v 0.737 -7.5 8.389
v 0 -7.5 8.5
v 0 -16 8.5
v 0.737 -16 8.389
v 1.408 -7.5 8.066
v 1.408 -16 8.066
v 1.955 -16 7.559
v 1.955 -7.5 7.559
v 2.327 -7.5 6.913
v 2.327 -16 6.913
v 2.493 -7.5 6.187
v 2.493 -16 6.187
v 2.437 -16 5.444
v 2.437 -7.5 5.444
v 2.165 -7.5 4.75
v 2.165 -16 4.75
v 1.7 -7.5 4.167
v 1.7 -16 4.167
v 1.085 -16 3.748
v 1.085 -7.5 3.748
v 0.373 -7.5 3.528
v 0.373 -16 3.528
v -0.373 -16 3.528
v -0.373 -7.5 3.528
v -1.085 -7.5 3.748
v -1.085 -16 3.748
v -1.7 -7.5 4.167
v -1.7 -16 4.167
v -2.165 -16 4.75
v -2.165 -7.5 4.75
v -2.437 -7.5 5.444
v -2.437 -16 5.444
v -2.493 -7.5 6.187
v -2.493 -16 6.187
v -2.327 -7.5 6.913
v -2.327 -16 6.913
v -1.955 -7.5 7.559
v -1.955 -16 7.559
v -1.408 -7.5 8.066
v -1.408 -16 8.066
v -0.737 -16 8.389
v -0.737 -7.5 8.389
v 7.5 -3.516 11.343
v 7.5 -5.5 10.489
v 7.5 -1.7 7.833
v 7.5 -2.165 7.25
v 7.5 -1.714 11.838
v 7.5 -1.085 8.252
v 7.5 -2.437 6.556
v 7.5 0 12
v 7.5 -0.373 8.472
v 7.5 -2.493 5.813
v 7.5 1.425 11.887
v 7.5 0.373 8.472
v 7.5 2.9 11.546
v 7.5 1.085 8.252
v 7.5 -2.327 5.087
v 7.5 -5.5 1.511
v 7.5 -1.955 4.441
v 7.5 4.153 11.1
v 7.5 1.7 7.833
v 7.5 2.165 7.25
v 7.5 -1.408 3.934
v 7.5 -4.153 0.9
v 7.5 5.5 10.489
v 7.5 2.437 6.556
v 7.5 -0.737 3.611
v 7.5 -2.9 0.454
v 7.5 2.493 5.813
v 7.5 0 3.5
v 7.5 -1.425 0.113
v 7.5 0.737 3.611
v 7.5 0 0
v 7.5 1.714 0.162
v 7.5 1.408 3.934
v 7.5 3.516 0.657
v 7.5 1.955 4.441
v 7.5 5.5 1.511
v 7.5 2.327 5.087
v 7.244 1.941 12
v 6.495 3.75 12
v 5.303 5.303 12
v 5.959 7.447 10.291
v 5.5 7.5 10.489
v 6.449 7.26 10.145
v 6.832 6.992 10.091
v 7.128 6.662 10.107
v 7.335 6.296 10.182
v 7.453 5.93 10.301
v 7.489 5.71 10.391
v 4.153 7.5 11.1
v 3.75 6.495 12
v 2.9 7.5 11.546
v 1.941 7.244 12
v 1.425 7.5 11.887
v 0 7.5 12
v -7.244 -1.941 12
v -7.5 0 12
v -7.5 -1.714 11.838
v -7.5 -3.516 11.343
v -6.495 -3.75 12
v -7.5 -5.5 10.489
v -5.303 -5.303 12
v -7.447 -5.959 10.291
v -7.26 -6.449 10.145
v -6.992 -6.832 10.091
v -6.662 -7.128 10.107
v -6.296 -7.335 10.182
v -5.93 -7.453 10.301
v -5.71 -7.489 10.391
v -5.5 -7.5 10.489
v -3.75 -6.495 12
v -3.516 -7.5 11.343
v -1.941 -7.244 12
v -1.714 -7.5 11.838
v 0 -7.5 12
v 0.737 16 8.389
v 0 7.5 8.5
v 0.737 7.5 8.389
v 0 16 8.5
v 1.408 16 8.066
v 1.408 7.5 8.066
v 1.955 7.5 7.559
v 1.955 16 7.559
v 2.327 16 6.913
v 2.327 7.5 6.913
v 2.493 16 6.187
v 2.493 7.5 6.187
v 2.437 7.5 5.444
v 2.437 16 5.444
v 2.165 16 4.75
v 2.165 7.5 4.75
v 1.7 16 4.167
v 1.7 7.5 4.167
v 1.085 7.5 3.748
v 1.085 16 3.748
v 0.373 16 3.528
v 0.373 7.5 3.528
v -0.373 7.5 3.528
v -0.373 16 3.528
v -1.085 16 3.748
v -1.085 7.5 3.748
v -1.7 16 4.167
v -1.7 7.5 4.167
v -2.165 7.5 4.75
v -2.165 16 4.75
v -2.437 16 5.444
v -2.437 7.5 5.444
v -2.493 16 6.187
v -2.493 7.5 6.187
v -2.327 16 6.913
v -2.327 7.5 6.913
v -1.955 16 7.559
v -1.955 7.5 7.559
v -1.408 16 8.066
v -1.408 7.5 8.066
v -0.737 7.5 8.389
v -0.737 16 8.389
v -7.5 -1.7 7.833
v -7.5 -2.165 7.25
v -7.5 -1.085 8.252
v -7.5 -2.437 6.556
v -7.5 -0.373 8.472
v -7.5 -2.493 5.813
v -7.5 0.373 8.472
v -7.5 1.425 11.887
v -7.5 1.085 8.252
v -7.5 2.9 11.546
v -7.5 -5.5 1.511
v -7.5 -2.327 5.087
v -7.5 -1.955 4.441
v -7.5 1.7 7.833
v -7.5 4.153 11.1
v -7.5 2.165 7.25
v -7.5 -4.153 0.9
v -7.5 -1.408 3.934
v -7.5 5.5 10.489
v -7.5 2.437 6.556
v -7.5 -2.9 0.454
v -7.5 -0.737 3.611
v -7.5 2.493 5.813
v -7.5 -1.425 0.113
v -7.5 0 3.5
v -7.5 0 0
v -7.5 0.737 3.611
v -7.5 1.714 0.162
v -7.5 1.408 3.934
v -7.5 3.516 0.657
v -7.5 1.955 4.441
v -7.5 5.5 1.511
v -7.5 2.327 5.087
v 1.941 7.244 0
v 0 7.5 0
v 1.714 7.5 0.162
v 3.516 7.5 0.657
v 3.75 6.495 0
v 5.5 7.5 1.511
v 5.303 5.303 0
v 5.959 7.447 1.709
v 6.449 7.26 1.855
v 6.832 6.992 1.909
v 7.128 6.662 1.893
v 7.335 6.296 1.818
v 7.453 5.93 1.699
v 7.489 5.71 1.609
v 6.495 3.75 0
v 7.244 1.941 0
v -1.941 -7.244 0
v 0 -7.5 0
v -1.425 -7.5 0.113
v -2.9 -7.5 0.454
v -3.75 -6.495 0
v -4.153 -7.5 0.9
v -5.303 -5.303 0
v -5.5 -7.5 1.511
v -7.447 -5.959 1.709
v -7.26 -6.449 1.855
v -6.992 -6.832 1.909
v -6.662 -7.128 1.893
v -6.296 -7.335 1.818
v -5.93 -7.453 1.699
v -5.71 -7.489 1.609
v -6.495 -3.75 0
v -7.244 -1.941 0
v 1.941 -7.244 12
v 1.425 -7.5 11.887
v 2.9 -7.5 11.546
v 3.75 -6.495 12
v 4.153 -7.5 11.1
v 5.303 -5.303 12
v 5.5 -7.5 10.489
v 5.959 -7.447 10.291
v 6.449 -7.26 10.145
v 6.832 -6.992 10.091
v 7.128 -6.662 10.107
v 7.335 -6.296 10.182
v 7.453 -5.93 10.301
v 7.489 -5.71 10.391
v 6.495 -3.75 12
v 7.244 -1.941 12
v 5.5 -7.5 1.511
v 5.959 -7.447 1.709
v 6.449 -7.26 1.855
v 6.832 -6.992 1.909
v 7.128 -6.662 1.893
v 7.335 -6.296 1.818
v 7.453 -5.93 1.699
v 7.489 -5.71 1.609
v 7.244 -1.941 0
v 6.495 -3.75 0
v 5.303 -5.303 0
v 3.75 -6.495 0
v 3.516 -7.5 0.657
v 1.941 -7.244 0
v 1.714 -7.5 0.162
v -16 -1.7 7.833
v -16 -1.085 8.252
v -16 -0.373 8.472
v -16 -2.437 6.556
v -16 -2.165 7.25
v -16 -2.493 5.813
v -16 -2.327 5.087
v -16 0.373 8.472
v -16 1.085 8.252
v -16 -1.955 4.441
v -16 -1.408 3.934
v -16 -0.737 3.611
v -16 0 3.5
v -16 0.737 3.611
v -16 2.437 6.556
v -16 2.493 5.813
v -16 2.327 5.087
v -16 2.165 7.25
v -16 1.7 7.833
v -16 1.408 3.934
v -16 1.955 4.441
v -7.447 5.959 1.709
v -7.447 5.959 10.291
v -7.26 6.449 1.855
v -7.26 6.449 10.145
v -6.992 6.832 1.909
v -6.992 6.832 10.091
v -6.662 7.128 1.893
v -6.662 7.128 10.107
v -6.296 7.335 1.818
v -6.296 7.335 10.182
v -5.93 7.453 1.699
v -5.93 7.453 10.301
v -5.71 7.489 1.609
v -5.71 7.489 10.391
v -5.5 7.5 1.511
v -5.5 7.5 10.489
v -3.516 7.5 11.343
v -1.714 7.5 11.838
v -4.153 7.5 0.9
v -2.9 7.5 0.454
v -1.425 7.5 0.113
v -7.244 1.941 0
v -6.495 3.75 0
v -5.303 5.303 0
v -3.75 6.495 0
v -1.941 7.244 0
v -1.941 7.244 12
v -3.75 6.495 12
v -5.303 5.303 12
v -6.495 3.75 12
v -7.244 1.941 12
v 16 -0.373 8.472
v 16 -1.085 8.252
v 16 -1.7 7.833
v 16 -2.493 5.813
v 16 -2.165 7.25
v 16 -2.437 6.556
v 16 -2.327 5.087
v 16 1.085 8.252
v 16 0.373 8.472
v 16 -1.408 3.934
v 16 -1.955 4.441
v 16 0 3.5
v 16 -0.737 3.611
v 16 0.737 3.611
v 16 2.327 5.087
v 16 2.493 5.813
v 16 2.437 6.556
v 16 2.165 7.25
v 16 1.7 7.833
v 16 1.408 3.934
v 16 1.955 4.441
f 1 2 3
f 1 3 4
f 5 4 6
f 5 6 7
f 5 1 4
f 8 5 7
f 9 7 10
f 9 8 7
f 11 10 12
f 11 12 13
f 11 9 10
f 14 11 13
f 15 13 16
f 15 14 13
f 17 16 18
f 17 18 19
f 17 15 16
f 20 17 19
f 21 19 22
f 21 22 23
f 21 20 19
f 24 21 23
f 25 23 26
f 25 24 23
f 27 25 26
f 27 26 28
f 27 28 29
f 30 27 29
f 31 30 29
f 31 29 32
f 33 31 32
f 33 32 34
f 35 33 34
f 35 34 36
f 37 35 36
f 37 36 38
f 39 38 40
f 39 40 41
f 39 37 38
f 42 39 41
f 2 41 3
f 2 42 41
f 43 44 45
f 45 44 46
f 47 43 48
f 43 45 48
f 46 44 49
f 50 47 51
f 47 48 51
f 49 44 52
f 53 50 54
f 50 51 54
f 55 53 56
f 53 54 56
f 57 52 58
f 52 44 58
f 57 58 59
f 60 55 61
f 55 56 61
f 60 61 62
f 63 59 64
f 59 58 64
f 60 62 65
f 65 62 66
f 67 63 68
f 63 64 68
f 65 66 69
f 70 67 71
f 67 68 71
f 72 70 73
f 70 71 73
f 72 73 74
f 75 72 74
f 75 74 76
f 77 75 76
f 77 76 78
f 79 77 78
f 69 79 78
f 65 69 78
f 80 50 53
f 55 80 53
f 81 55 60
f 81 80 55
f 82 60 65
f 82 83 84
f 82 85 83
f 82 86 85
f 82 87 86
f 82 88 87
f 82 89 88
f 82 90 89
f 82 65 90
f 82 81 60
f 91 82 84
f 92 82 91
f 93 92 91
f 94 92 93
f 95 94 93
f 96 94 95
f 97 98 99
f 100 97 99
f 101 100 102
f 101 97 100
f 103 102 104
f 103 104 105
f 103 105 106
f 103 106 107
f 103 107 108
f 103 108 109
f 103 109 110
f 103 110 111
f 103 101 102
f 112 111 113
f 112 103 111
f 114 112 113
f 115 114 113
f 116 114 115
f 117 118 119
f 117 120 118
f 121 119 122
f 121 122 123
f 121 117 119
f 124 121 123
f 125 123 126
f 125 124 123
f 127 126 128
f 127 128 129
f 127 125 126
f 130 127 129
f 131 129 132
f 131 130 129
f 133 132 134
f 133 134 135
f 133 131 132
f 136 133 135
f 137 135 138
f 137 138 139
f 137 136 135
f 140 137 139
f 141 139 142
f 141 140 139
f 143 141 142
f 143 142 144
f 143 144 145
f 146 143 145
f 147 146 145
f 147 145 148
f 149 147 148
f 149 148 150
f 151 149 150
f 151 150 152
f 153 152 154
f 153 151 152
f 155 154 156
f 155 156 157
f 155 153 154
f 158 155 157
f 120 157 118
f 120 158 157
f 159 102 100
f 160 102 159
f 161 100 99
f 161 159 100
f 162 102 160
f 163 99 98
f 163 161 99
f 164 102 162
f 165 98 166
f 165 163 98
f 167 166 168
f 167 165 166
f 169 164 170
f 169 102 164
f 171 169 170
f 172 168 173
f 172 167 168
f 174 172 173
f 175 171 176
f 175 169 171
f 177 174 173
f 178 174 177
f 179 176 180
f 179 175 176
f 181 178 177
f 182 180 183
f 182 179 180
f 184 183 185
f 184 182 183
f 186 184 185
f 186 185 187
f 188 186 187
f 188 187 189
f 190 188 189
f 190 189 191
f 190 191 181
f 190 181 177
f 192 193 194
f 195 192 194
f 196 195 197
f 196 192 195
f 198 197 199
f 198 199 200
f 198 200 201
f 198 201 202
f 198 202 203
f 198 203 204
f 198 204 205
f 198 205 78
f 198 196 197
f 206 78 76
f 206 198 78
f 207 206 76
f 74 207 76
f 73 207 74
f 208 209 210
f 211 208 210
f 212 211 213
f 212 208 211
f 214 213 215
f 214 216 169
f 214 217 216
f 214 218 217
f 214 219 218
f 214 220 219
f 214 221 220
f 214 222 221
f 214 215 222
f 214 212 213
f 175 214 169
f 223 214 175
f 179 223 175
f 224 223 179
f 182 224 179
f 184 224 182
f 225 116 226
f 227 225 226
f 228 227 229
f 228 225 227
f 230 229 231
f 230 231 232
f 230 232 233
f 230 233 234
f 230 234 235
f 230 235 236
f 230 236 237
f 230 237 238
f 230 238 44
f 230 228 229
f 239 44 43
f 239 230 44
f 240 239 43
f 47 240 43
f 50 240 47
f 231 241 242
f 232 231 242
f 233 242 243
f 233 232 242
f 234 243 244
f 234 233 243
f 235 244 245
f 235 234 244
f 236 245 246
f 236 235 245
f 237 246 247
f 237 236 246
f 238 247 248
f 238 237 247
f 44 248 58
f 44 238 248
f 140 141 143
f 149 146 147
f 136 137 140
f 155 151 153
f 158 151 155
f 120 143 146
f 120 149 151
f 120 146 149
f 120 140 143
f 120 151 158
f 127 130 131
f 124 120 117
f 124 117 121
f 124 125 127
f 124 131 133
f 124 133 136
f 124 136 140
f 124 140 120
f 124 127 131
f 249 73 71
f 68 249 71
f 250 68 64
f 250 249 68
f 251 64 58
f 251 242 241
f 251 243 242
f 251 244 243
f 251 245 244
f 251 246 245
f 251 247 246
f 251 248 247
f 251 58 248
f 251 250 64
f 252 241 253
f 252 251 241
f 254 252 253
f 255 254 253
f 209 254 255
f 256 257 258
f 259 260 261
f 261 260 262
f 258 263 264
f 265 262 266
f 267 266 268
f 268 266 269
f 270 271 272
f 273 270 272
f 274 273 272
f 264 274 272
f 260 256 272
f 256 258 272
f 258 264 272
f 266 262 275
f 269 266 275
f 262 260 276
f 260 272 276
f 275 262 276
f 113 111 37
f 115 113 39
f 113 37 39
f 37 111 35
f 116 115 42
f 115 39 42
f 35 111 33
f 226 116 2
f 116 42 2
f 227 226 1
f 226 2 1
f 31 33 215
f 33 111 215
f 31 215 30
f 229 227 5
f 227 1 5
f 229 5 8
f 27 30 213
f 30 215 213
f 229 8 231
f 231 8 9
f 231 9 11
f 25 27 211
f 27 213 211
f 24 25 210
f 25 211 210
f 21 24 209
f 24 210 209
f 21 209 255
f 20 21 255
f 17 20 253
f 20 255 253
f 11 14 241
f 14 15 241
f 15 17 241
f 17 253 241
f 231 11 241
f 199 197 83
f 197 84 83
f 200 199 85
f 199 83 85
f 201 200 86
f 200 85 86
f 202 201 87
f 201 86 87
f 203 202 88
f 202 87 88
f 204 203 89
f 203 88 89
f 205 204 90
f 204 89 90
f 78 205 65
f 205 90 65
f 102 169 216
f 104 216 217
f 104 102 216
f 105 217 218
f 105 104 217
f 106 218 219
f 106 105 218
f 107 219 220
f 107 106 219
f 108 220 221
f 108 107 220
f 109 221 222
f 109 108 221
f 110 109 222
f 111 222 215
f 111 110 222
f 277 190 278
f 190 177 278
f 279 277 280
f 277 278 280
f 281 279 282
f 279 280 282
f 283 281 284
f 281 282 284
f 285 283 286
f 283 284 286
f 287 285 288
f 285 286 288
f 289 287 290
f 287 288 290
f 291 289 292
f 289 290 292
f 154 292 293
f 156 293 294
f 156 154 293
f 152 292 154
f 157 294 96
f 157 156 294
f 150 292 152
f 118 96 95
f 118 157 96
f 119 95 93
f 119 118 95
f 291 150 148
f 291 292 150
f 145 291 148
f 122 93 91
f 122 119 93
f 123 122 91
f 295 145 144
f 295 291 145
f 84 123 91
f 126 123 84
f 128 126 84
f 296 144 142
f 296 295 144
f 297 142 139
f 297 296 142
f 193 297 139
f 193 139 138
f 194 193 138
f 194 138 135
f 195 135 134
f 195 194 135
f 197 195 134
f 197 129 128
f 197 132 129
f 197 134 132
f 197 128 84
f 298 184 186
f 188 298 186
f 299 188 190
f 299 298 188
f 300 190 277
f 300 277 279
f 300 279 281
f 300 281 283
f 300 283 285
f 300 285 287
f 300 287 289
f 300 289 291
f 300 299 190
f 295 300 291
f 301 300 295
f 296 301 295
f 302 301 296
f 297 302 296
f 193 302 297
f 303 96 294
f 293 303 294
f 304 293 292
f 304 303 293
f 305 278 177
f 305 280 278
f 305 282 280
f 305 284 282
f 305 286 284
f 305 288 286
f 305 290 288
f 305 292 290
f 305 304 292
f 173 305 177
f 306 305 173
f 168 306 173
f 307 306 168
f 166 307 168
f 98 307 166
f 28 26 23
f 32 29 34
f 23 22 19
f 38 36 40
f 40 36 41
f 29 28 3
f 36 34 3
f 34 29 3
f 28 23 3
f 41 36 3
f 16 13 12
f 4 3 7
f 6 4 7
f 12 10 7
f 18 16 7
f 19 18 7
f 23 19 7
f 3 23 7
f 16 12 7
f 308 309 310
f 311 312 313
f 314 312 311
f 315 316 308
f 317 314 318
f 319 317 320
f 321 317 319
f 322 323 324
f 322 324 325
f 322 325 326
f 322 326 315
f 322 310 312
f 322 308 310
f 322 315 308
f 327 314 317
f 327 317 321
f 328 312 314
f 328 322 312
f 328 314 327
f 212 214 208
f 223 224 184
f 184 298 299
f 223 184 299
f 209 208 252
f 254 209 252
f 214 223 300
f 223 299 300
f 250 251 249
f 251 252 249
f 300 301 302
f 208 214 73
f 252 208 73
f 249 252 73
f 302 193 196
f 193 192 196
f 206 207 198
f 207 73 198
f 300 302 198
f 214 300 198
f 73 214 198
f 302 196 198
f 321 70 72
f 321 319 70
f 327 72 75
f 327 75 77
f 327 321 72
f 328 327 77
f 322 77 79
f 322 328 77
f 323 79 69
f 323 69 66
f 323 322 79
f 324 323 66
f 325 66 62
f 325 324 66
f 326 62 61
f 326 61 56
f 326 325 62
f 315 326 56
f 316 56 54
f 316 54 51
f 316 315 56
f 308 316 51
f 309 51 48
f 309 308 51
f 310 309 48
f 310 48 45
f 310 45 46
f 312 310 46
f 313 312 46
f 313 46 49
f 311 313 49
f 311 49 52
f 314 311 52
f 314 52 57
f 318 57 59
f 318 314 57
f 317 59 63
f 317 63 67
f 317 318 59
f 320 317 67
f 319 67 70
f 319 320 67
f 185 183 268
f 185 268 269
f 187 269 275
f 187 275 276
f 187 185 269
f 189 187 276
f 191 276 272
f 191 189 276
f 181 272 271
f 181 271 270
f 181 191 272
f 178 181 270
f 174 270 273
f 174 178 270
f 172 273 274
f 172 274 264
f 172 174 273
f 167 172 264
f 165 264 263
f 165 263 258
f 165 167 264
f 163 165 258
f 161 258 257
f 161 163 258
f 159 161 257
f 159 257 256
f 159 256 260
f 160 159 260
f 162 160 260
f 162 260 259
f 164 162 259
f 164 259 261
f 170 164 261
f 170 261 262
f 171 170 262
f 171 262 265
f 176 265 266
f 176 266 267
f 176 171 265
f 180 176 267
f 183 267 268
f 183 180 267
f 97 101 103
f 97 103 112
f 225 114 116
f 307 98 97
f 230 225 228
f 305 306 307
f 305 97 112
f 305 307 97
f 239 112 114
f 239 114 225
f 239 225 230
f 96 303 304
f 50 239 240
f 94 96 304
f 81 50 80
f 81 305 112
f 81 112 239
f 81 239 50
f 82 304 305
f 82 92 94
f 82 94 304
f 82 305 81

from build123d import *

# Parameters (mm, degrees)
SKETCH1_W           = 15
SKETCH1_H           = 15
BOSS_EXTRUDE1_DEPTH = 12
SKETCH2_OUTSIDE_W   = 69.544
SKETCH2_OUTSIDE_H   = 69.544
SKETCH2_OUTSIDE_R   = 7.5
CUT_EXTRUDE1_DEPTH  = 20
CUT_EXTRUDE1_DRAFT  = -50
SKETCH3_OUTSIDE_W   = 69.544
SKETCH3_OUTSIDE_H   = 69.544
SKETCH3_OUTSIDE_R   = 7.5
CUT_EXTRUDE2_DEPTH  = 20
CUT_EXTRUDE2_DRAFT  = -50
FILLET1_R           = 2
SKETCH5_R           = 2.5
BOSS_EXTRUDE2_DEPTH = 16
SKETCH6_R           = 2.5
BOSS_EXTRUDE3_DEPTH = 16


with BuildPart() as part:
    # Sketch1 → Boss-Extrude1 (new body)
    with BuildSketch(Plane.XY):
        Rectangle(SKETCH1_W, SKETCH1_H)
    extrude(amount=BOSS_EXTRUDE1_DEPTH)


with BuildPart() as cut_extrude1_tool:
    # Sketch2 outside → Cut-Extrude1 (with draft: the straight prism first)
    with BuildSketch(Plane.XY.offset(12)):
        Rectangle(SKETCH2_OUTSIDE_W, SKETCH2_OUTSIDE_H)
        Circle(SKETCH2_OUTSIDE_R, mode=Mode.SUBTRACT)
    extrude(amount=-CUT_EXTRUDE1_DEPTH)
    # Cut-Extrude1: the draft: its side faces are tilted about the plane it starts from
    cut_extrude1_sides = [cut_extrude1_tool.faces().sort_by_distance(p)[0] for p in [
        (0, -34.772, 2),
        (34.772, 0, 2),
        (0, 34.772, 2),
        (-34.772, 0, 2),
        (-7.5, 0, 2),
    ]]
    draft(cut_extrude1_sides, Plane.XY.offset(12), CUT_EXTRUDE1_DRAFT)


with BuildPart() as part_1:
    add(part.part)

    # Cut-Extrude1: cut by cut_extrude1_tool
    add(cut_extrude1_tool.part, mode=Mode.SUBTRACT)


with BuildPart() as cut_extrude2_tool:
    # Sketch3 outside → Cut-Extrude2 (with draft: the straight prism first)
    with BuildSketch(Plane(origin=(0, 0, 0), x_dir=(-1, 0, 0), z_dir=(0, 0, -1))):
        Rectangle(SKETCH3_OUTSIDE_W, SKETCH3_OUTSIDE_H)
        Circle(SKETCH3_OUTSIDE_R, mode=Mode.SUBTRACT)
    extrude(amount=-CUT_EXTRUDE2_DEPTH)
    # Cut-Extrude2: the draft: its side faces are tilted about the plane it starts from
    cut_extrude2_sides = [cut_extrude2_tool.faces().sort_by_distance(p)[0] for p in [
        (0, -34.772, 10),
        (-34.772, 0, 10),
        (0, 34.772, 10),
        (34.772, 0, 10),
        (7.5, 0, 10),
    ]]
    draft(cut_extrude2_sides, Plane(origin=(0, 0, 0), x_dir=(-1, 0, 0), z_dir=(0, 0, -1)), CUT_EXTRUDE2_DRAFT)


with BuildPart() as part_2:
    add(part_1.part)

    # Cut-Extrude2: cut by cut_extrude2_tool
    add(cut_extrude2_tool.part, mode=Mode.SUBTRACT)

    # Fillet1
    fillet1_edges = [part_2.edges().sort_by_distance(p)[0] for p in [
        (7.5, -7.5, 6),
        (7.5, 7.5, 6),
        (-7.5, 7.5, 6),
        (-7.5, -7.5, 6),
    ]]
    fillet(fillet1_edges, radius=FILLET1_R)

    # Sketch5 → Boss-Extrude2 (add, symmetric)
    with BuildSketch(Plane(origin=(0, 0, 0), x_dir=(1, 0, 0), z_dir=(0, 1, 0))):
        with Locations(Location((0, -6, 0), (0, 0, 270))):
            Circle(SKETCH5_R)
    extrude(amount=BOSS_EXTRUDE2_DEPTH, both=True)

    # Sketch6 → Boss-Extrude3 (add, symmetric)
    with BuildSketch(Plane(origin=(0, 0, 0), x_dir=(0, 0, -1), z_dir=(1, 0, 0))):
        with Locations((-6, 0)):
            Circle(SKETCH6_R)
    extrude(amount=BOSS_EXTRUDE3_DEPTH, both=True)


solid = part_2.part
